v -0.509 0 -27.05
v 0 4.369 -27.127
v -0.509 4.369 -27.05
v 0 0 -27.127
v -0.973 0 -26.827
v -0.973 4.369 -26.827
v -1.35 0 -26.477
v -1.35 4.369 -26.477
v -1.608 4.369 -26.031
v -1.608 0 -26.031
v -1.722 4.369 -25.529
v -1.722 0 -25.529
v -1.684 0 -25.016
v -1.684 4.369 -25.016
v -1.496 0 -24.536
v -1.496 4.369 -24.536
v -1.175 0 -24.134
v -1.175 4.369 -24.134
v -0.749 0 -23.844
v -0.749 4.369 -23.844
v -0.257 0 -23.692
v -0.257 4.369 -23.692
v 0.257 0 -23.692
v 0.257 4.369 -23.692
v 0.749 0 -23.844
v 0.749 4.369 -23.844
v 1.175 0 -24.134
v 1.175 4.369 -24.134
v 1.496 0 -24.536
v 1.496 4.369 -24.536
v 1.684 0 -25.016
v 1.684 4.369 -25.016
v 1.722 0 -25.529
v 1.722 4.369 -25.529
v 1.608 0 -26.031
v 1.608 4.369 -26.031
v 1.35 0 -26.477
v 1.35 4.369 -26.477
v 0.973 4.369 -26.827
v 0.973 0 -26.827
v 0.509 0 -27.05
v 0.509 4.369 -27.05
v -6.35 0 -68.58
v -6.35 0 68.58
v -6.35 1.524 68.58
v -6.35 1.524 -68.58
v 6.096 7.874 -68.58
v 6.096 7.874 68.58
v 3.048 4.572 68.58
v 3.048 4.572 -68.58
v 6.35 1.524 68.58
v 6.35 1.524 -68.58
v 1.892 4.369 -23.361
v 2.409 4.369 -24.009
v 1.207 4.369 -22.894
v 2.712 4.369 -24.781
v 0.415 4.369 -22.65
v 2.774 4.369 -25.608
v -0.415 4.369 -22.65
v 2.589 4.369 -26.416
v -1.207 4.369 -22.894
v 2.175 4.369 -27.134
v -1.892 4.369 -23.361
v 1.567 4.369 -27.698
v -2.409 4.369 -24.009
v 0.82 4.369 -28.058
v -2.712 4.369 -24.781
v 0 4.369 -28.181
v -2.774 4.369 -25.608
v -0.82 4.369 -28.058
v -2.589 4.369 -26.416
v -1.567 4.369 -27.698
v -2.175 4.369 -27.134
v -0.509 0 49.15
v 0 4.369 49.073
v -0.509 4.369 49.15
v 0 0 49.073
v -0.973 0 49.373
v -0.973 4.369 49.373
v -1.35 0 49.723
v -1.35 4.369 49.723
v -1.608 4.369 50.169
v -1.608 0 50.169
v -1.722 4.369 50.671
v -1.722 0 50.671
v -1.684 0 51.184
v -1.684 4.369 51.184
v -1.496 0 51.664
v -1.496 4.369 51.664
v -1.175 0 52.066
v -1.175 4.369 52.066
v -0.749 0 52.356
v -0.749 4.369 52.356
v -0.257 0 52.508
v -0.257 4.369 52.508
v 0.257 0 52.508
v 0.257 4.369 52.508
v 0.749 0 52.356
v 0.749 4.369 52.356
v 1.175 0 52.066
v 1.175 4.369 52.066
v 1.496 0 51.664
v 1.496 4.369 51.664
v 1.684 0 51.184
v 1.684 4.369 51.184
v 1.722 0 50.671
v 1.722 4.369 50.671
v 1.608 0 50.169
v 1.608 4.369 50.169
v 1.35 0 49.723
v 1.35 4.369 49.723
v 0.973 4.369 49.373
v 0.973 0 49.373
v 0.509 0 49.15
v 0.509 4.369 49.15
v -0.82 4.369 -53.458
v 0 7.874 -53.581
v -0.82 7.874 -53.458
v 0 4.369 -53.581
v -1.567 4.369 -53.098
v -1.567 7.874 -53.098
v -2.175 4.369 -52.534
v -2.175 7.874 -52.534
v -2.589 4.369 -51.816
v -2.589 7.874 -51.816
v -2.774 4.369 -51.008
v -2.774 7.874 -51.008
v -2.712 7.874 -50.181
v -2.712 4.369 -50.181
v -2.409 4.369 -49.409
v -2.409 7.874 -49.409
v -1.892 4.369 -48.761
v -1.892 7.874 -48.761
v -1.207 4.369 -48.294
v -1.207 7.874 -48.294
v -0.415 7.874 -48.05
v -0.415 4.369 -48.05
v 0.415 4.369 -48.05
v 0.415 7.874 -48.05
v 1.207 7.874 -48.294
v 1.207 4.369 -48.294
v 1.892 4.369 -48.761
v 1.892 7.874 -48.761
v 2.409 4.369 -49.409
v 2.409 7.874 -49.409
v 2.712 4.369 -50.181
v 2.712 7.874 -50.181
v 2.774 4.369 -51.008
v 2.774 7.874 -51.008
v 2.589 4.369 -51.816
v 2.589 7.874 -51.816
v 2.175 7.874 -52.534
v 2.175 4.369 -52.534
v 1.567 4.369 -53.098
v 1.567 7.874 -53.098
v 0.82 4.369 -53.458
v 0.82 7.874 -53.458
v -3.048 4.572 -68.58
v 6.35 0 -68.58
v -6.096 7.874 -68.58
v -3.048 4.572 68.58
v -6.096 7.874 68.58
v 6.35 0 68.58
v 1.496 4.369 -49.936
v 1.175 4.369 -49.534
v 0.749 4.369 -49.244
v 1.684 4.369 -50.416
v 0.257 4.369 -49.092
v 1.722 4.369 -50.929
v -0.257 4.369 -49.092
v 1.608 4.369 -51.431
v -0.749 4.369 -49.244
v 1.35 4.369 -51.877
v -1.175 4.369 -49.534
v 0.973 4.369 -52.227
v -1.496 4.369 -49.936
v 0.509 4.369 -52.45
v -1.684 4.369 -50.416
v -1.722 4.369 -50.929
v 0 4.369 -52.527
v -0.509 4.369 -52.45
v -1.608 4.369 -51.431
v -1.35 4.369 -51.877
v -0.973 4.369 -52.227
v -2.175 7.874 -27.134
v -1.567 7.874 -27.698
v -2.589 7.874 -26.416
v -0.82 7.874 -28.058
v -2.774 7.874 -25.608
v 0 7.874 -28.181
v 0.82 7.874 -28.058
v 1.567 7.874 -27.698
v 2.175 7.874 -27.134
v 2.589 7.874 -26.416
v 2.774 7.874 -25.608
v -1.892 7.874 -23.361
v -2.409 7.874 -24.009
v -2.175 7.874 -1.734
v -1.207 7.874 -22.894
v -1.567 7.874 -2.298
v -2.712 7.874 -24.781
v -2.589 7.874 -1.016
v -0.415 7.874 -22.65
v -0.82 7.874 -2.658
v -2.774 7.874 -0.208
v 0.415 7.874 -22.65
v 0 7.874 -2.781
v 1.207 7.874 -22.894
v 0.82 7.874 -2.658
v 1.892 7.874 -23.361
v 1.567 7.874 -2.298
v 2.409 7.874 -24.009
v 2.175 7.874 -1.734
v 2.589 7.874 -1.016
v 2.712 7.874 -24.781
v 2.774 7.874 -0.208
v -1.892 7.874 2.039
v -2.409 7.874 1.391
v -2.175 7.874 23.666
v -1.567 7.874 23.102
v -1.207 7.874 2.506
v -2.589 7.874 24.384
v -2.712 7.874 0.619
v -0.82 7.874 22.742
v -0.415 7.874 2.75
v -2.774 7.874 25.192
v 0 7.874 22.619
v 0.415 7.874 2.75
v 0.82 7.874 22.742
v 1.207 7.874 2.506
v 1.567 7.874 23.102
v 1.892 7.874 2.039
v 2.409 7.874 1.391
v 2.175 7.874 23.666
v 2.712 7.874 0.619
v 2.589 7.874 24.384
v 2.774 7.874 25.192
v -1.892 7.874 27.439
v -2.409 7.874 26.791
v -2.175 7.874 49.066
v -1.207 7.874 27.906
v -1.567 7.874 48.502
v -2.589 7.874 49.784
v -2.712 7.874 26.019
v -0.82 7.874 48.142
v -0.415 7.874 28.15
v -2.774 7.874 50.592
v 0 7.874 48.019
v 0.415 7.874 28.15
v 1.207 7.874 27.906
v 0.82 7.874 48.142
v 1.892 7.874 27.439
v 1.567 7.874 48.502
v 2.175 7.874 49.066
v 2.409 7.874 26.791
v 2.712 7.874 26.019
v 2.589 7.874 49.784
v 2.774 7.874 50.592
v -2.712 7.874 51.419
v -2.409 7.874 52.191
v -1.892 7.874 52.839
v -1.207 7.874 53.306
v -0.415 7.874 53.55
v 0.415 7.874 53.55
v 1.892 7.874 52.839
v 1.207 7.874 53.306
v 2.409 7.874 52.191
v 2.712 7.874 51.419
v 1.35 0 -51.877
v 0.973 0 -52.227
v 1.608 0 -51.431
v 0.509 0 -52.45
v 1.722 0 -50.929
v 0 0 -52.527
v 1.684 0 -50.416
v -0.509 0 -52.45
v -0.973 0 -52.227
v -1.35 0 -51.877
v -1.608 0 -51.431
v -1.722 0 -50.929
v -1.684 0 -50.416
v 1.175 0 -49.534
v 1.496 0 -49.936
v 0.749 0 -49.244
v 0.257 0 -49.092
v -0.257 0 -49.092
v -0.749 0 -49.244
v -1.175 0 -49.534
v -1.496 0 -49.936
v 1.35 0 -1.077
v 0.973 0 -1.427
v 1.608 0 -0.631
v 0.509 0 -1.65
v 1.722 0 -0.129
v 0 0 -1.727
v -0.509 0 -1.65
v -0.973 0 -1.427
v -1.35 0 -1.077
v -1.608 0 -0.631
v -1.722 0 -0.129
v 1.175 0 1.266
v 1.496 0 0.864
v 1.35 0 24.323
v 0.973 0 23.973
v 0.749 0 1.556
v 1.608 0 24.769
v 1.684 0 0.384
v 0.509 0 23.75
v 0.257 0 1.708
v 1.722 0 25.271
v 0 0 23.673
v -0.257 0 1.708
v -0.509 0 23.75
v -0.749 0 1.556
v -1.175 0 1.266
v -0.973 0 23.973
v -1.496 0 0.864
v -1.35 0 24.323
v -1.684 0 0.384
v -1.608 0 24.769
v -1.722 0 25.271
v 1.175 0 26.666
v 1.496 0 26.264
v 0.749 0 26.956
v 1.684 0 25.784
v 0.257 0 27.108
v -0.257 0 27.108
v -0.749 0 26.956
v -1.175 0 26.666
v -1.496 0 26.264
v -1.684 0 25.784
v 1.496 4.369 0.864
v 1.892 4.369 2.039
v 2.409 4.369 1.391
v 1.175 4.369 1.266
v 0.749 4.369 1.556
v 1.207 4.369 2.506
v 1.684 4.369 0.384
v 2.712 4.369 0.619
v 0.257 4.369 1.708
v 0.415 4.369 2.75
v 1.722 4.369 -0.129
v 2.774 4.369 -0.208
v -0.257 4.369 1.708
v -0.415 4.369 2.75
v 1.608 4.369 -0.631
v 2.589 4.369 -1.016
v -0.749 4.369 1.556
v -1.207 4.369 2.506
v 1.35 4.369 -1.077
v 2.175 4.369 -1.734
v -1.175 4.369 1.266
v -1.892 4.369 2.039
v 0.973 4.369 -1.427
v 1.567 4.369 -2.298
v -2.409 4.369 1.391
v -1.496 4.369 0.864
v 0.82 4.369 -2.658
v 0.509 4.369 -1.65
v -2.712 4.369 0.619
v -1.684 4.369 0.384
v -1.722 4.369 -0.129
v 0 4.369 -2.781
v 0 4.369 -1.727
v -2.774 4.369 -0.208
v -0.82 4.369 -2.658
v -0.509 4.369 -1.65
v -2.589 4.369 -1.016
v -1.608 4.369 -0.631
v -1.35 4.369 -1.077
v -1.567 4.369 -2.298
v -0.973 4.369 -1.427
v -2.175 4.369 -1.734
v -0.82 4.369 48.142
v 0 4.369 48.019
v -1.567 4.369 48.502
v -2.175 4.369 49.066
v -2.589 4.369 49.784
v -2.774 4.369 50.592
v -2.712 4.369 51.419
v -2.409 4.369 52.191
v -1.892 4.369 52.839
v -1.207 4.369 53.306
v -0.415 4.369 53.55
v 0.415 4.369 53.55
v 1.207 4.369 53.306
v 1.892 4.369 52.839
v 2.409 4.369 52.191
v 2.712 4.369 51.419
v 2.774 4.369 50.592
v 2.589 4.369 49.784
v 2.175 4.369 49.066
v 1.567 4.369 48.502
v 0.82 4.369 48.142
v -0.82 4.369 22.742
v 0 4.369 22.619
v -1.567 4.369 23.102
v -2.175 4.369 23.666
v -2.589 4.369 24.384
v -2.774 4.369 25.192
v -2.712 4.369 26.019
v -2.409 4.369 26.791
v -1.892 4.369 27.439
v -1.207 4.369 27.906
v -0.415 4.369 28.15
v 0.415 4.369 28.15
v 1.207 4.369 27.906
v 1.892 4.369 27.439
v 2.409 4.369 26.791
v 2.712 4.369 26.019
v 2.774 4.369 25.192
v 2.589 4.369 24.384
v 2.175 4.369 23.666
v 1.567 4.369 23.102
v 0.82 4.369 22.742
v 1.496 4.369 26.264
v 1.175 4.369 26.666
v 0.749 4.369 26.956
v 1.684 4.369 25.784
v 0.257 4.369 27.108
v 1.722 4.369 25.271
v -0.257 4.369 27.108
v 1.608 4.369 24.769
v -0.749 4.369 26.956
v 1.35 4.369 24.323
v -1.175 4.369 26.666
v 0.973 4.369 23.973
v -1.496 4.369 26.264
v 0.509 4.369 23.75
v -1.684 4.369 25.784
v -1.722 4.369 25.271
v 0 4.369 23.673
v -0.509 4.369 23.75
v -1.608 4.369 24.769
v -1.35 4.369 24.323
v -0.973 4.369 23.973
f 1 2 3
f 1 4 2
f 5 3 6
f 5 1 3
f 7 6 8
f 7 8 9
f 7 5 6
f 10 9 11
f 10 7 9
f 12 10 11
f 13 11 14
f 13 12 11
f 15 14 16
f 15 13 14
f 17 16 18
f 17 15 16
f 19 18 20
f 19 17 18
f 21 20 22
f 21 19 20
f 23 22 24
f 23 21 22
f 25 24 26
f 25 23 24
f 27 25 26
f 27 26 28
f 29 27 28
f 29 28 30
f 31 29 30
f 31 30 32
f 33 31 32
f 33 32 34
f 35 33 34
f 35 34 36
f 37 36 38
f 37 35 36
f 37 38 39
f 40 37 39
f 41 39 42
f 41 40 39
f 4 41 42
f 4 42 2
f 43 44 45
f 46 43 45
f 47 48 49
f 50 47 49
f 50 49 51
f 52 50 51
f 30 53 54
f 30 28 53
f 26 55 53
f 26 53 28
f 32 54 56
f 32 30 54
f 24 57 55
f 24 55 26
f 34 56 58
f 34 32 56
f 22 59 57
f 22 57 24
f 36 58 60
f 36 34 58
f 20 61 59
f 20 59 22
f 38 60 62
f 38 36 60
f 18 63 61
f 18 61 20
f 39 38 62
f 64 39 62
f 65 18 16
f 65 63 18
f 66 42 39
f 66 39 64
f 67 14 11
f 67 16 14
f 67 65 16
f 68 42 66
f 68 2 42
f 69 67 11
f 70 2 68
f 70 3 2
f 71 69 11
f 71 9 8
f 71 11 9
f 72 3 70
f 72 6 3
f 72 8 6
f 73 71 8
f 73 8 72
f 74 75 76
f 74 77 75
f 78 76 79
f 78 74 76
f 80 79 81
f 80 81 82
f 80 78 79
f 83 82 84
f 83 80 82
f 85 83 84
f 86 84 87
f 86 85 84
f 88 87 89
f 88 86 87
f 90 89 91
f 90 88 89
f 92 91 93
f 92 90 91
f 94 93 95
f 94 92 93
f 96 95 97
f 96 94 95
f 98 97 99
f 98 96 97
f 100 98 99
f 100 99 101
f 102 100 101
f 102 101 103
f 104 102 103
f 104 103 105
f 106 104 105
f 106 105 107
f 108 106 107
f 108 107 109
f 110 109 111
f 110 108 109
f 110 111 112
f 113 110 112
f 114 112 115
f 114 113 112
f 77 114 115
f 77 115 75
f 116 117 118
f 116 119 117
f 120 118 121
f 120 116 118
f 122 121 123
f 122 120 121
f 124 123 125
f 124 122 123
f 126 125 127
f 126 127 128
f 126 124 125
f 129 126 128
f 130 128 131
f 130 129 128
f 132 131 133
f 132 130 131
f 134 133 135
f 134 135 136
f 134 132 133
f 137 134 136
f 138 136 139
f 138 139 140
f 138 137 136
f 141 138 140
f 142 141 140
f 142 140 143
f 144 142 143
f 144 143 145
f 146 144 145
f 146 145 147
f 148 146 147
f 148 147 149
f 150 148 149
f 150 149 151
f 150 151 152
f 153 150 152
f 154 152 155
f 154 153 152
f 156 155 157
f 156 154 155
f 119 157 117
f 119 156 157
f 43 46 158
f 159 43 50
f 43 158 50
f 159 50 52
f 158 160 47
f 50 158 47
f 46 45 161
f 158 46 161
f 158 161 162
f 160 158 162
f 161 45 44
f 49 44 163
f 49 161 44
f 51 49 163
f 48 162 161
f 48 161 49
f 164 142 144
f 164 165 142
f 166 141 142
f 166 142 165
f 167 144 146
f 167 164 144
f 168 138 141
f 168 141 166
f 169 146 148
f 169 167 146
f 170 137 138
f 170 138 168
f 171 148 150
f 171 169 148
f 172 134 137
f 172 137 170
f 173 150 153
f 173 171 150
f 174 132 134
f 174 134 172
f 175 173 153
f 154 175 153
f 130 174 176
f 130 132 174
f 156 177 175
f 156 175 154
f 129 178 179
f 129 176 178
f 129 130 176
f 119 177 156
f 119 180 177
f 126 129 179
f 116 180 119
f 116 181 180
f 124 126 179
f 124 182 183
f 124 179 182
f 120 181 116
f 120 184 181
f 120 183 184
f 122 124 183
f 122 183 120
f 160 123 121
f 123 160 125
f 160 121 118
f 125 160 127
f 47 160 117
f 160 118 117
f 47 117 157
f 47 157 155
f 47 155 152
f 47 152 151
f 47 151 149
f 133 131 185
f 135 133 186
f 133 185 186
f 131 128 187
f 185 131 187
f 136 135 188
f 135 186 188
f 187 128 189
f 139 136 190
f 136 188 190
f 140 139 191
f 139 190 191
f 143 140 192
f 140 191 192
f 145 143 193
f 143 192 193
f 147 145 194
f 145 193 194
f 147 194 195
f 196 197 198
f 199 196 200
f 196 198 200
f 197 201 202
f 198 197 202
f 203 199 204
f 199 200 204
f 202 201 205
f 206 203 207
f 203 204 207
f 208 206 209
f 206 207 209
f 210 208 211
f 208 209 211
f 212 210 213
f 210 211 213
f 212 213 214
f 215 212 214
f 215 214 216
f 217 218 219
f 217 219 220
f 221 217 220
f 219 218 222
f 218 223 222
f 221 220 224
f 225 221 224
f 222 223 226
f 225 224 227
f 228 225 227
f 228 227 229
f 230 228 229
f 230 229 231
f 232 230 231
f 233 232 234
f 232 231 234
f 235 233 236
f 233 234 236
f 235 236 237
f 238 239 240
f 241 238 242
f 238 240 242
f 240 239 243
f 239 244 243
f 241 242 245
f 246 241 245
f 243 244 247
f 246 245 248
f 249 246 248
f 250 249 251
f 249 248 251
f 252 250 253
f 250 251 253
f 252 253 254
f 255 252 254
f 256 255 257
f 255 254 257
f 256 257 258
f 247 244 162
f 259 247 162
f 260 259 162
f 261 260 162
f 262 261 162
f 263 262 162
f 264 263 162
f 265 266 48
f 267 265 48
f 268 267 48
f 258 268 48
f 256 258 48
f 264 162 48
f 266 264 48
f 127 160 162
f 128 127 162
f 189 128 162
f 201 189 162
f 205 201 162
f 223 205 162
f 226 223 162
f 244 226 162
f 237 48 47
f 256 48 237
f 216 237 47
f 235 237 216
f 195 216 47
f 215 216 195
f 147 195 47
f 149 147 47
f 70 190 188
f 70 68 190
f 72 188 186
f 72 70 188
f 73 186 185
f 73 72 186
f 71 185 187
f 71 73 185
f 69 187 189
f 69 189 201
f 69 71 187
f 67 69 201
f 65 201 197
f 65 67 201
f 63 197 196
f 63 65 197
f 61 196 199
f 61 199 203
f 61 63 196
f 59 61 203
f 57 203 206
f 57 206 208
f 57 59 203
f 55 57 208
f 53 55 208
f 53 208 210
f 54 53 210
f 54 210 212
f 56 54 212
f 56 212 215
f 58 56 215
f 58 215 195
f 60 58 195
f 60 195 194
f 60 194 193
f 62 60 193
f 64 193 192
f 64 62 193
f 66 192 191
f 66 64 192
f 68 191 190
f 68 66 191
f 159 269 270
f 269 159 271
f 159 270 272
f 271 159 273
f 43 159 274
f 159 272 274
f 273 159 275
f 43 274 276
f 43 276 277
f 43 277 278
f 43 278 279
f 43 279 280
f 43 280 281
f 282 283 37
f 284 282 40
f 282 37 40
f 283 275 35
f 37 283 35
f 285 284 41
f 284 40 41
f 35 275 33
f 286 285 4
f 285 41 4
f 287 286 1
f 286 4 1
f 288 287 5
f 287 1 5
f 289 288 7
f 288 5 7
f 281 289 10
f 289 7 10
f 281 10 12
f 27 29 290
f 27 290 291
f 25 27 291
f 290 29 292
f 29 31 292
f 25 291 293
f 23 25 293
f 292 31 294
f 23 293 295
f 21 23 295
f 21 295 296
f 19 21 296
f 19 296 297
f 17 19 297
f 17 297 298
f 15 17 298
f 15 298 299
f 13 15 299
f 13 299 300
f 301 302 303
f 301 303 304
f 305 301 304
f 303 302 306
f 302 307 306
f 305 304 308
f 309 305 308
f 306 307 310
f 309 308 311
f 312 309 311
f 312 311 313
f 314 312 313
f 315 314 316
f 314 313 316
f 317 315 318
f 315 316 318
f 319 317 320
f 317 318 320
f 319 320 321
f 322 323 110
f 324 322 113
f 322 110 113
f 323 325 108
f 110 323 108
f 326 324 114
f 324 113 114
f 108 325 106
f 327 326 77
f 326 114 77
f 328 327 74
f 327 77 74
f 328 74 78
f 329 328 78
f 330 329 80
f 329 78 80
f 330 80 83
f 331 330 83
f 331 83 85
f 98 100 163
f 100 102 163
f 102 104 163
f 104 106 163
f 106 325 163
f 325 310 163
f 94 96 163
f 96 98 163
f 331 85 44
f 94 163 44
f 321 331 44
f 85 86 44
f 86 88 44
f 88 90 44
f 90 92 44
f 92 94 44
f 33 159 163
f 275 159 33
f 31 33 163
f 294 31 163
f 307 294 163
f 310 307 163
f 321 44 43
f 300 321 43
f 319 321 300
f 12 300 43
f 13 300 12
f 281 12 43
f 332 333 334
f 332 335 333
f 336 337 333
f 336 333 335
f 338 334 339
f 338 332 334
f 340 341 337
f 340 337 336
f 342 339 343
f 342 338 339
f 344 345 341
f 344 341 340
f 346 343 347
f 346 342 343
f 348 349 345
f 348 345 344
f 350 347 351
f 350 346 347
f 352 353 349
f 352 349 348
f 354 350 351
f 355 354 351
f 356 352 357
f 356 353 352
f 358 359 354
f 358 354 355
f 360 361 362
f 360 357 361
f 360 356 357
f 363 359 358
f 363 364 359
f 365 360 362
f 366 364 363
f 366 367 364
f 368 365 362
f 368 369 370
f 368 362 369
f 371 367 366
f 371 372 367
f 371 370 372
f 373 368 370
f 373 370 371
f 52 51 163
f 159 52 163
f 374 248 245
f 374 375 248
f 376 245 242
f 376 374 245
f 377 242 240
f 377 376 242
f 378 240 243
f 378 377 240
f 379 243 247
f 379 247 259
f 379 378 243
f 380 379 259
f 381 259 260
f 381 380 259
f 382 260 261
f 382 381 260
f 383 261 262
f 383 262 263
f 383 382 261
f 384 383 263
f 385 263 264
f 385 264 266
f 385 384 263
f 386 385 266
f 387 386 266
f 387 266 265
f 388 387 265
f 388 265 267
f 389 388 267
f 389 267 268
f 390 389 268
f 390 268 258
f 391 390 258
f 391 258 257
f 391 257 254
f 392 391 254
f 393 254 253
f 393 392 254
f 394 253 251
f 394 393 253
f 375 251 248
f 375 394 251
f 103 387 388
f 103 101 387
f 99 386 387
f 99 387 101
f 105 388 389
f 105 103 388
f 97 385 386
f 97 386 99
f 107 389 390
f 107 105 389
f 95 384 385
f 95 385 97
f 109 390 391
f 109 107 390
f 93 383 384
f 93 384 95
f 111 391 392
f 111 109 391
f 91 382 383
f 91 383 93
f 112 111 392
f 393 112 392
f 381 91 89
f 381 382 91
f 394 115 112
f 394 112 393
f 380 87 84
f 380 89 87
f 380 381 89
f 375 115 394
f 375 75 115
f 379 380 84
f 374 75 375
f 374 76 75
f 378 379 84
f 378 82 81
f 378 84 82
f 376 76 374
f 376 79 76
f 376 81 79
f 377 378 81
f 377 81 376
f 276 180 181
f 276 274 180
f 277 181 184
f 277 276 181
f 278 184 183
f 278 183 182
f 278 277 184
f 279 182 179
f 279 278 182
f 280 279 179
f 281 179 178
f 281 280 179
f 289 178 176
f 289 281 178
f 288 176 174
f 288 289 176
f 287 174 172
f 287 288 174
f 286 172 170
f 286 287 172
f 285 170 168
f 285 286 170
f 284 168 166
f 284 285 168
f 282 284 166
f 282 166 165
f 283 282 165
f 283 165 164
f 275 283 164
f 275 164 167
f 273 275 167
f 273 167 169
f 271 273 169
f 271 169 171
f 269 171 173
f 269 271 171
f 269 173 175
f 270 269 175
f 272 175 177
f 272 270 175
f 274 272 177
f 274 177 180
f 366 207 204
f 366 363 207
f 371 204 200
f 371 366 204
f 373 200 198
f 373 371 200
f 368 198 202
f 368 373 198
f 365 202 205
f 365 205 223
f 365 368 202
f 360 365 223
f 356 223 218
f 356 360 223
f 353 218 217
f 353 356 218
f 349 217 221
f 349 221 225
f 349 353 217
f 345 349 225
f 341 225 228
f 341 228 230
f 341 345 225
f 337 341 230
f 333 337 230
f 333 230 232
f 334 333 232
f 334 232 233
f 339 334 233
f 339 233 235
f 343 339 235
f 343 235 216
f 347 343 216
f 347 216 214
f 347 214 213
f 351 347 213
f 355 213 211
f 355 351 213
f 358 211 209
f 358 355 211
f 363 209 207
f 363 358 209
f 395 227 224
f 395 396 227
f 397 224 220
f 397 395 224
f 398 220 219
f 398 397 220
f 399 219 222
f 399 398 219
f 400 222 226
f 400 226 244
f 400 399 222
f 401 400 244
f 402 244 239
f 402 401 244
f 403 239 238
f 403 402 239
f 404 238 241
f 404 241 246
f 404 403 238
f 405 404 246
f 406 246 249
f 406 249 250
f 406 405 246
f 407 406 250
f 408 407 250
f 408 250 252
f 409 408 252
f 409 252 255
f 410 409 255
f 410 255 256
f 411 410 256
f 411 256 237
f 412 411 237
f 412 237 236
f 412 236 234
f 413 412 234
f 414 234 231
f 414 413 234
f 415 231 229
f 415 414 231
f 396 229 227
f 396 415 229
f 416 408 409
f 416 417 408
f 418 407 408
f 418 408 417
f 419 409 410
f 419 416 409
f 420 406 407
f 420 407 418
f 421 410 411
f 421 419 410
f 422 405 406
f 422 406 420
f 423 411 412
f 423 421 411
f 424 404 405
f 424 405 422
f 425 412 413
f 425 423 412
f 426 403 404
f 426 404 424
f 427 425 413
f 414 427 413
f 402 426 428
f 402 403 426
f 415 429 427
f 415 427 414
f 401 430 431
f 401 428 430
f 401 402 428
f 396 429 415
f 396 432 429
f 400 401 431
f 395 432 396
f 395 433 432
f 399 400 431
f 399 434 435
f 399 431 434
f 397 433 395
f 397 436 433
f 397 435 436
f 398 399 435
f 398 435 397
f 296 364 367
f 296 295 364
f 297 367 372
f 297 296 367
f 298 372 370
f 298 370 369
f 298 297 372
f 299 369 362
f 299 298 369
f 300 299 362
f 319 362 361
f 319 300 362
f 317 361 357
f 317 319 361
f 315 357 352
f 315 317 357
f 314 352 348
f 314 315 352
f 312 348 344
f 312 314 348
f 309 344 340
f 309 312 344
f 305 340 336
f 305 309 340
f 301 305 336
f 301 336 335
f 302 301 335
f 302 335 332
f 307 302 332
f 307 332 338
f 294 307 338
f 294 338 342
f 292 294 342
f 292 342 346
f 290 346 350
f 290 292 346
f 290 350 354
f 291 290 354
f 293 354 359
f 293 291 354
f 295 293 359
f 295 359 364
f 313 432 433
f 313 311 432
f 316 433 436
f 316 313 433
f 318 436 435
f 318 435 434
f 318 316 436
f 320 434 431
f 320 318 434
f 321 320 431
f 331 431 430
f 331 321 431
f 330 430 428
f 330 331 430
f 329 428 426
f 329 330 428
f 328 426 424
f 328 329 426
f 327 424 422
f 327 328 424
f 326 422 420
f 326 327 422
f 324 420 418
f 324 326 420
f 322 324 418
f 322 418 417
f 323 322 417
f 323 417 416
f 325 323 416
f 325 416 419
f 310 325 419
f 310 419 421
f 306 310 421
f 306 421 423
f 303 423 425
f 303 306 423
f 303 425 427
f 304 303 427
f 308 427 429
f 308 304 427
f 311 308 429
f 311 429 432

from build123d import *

# Parameters (mm, degrees)
BOSS_EXTRUDE1_DEPTH = 88.9
LPATTERN2_COUNT     = 7
LPATTERN2_PITCH     = 25.4
SKETCH4_W           = 18.597058872
SKETCH4_H           = 20.764352928
SKETCH4_W_2         = 25.241981834
SKETCH4_H_2         = 23.038412947
CUT_EXTRUDE1_DEPTH  = 90.473640677


with BuildPart() as part:
    # Sketch1 → Boss-Extrude1 (new, symmetric)
    with BuildSketch(Plane.XY):
        Polygon((-6.096, 7.874), (6.096, 7.874), (3.048, 4.572), (6.35, 1.524), (6.35, 0), (-6.35, 0), (-6.35, 1.524), (-3.048, 4.572), align=None)
    extrude(amount=BOSS_EXTRUDE1_DEPTH, both=True)

    # Sketch2 → Cut-Revolve1 (revolve, cut)
    with BuildSketch(Plane(origin=(0, 0, 0), x_dir=(0, 0, -1), z_dir=(1, 0, 0)), mode=Mode.PRIVATE) as cut_revolve1_sk:
        Polygon((-78.9813, 7.874), (-78.9813, 4.3688), (-77.9272, 4.3688), (-77.9272, 0), (-76.2, 0), (-76.2, 7.874), align=None)
    cut_revolve1 = revolve(cut_revolve1_sk.sketch.rotate(Axis((0, 0, 76.2), (0, 1, 0)), 180), axis=Axis((0, 0, 76.2), (0, 1, 0)), mode=Mode.SUBTRACT)

    # LPattern2: Cut-Revolve1 ×7
    with Locations(*[(0, 0, -i * LPATTERN2_PITCH) for i in range(1, LPATTERN2_COUNT)]):
        add(cut_revolve1, mode=Mode.SUBTRACT)

    # Sketch4 → Cut-Extrude1 (cut, through all)
    with BuildSketch(Plane(origin=(0, 7.874, 0), x_dir=(1, 0, 0), z_dir=(0, 1, 0))):
        with Locations((0, 78.962176464)):
            Rectangle(SKETCH4_W, SKETCH4_H)
        with Locations((0, -80.099206474)):
            Rectangle(SKETCH4_W_2, SKETCH4_H_2)
    extrude(amount=-CUT_EXTRUDE1_DEPTH, mode=Mode.SUBTRACT)


solid = part.part
